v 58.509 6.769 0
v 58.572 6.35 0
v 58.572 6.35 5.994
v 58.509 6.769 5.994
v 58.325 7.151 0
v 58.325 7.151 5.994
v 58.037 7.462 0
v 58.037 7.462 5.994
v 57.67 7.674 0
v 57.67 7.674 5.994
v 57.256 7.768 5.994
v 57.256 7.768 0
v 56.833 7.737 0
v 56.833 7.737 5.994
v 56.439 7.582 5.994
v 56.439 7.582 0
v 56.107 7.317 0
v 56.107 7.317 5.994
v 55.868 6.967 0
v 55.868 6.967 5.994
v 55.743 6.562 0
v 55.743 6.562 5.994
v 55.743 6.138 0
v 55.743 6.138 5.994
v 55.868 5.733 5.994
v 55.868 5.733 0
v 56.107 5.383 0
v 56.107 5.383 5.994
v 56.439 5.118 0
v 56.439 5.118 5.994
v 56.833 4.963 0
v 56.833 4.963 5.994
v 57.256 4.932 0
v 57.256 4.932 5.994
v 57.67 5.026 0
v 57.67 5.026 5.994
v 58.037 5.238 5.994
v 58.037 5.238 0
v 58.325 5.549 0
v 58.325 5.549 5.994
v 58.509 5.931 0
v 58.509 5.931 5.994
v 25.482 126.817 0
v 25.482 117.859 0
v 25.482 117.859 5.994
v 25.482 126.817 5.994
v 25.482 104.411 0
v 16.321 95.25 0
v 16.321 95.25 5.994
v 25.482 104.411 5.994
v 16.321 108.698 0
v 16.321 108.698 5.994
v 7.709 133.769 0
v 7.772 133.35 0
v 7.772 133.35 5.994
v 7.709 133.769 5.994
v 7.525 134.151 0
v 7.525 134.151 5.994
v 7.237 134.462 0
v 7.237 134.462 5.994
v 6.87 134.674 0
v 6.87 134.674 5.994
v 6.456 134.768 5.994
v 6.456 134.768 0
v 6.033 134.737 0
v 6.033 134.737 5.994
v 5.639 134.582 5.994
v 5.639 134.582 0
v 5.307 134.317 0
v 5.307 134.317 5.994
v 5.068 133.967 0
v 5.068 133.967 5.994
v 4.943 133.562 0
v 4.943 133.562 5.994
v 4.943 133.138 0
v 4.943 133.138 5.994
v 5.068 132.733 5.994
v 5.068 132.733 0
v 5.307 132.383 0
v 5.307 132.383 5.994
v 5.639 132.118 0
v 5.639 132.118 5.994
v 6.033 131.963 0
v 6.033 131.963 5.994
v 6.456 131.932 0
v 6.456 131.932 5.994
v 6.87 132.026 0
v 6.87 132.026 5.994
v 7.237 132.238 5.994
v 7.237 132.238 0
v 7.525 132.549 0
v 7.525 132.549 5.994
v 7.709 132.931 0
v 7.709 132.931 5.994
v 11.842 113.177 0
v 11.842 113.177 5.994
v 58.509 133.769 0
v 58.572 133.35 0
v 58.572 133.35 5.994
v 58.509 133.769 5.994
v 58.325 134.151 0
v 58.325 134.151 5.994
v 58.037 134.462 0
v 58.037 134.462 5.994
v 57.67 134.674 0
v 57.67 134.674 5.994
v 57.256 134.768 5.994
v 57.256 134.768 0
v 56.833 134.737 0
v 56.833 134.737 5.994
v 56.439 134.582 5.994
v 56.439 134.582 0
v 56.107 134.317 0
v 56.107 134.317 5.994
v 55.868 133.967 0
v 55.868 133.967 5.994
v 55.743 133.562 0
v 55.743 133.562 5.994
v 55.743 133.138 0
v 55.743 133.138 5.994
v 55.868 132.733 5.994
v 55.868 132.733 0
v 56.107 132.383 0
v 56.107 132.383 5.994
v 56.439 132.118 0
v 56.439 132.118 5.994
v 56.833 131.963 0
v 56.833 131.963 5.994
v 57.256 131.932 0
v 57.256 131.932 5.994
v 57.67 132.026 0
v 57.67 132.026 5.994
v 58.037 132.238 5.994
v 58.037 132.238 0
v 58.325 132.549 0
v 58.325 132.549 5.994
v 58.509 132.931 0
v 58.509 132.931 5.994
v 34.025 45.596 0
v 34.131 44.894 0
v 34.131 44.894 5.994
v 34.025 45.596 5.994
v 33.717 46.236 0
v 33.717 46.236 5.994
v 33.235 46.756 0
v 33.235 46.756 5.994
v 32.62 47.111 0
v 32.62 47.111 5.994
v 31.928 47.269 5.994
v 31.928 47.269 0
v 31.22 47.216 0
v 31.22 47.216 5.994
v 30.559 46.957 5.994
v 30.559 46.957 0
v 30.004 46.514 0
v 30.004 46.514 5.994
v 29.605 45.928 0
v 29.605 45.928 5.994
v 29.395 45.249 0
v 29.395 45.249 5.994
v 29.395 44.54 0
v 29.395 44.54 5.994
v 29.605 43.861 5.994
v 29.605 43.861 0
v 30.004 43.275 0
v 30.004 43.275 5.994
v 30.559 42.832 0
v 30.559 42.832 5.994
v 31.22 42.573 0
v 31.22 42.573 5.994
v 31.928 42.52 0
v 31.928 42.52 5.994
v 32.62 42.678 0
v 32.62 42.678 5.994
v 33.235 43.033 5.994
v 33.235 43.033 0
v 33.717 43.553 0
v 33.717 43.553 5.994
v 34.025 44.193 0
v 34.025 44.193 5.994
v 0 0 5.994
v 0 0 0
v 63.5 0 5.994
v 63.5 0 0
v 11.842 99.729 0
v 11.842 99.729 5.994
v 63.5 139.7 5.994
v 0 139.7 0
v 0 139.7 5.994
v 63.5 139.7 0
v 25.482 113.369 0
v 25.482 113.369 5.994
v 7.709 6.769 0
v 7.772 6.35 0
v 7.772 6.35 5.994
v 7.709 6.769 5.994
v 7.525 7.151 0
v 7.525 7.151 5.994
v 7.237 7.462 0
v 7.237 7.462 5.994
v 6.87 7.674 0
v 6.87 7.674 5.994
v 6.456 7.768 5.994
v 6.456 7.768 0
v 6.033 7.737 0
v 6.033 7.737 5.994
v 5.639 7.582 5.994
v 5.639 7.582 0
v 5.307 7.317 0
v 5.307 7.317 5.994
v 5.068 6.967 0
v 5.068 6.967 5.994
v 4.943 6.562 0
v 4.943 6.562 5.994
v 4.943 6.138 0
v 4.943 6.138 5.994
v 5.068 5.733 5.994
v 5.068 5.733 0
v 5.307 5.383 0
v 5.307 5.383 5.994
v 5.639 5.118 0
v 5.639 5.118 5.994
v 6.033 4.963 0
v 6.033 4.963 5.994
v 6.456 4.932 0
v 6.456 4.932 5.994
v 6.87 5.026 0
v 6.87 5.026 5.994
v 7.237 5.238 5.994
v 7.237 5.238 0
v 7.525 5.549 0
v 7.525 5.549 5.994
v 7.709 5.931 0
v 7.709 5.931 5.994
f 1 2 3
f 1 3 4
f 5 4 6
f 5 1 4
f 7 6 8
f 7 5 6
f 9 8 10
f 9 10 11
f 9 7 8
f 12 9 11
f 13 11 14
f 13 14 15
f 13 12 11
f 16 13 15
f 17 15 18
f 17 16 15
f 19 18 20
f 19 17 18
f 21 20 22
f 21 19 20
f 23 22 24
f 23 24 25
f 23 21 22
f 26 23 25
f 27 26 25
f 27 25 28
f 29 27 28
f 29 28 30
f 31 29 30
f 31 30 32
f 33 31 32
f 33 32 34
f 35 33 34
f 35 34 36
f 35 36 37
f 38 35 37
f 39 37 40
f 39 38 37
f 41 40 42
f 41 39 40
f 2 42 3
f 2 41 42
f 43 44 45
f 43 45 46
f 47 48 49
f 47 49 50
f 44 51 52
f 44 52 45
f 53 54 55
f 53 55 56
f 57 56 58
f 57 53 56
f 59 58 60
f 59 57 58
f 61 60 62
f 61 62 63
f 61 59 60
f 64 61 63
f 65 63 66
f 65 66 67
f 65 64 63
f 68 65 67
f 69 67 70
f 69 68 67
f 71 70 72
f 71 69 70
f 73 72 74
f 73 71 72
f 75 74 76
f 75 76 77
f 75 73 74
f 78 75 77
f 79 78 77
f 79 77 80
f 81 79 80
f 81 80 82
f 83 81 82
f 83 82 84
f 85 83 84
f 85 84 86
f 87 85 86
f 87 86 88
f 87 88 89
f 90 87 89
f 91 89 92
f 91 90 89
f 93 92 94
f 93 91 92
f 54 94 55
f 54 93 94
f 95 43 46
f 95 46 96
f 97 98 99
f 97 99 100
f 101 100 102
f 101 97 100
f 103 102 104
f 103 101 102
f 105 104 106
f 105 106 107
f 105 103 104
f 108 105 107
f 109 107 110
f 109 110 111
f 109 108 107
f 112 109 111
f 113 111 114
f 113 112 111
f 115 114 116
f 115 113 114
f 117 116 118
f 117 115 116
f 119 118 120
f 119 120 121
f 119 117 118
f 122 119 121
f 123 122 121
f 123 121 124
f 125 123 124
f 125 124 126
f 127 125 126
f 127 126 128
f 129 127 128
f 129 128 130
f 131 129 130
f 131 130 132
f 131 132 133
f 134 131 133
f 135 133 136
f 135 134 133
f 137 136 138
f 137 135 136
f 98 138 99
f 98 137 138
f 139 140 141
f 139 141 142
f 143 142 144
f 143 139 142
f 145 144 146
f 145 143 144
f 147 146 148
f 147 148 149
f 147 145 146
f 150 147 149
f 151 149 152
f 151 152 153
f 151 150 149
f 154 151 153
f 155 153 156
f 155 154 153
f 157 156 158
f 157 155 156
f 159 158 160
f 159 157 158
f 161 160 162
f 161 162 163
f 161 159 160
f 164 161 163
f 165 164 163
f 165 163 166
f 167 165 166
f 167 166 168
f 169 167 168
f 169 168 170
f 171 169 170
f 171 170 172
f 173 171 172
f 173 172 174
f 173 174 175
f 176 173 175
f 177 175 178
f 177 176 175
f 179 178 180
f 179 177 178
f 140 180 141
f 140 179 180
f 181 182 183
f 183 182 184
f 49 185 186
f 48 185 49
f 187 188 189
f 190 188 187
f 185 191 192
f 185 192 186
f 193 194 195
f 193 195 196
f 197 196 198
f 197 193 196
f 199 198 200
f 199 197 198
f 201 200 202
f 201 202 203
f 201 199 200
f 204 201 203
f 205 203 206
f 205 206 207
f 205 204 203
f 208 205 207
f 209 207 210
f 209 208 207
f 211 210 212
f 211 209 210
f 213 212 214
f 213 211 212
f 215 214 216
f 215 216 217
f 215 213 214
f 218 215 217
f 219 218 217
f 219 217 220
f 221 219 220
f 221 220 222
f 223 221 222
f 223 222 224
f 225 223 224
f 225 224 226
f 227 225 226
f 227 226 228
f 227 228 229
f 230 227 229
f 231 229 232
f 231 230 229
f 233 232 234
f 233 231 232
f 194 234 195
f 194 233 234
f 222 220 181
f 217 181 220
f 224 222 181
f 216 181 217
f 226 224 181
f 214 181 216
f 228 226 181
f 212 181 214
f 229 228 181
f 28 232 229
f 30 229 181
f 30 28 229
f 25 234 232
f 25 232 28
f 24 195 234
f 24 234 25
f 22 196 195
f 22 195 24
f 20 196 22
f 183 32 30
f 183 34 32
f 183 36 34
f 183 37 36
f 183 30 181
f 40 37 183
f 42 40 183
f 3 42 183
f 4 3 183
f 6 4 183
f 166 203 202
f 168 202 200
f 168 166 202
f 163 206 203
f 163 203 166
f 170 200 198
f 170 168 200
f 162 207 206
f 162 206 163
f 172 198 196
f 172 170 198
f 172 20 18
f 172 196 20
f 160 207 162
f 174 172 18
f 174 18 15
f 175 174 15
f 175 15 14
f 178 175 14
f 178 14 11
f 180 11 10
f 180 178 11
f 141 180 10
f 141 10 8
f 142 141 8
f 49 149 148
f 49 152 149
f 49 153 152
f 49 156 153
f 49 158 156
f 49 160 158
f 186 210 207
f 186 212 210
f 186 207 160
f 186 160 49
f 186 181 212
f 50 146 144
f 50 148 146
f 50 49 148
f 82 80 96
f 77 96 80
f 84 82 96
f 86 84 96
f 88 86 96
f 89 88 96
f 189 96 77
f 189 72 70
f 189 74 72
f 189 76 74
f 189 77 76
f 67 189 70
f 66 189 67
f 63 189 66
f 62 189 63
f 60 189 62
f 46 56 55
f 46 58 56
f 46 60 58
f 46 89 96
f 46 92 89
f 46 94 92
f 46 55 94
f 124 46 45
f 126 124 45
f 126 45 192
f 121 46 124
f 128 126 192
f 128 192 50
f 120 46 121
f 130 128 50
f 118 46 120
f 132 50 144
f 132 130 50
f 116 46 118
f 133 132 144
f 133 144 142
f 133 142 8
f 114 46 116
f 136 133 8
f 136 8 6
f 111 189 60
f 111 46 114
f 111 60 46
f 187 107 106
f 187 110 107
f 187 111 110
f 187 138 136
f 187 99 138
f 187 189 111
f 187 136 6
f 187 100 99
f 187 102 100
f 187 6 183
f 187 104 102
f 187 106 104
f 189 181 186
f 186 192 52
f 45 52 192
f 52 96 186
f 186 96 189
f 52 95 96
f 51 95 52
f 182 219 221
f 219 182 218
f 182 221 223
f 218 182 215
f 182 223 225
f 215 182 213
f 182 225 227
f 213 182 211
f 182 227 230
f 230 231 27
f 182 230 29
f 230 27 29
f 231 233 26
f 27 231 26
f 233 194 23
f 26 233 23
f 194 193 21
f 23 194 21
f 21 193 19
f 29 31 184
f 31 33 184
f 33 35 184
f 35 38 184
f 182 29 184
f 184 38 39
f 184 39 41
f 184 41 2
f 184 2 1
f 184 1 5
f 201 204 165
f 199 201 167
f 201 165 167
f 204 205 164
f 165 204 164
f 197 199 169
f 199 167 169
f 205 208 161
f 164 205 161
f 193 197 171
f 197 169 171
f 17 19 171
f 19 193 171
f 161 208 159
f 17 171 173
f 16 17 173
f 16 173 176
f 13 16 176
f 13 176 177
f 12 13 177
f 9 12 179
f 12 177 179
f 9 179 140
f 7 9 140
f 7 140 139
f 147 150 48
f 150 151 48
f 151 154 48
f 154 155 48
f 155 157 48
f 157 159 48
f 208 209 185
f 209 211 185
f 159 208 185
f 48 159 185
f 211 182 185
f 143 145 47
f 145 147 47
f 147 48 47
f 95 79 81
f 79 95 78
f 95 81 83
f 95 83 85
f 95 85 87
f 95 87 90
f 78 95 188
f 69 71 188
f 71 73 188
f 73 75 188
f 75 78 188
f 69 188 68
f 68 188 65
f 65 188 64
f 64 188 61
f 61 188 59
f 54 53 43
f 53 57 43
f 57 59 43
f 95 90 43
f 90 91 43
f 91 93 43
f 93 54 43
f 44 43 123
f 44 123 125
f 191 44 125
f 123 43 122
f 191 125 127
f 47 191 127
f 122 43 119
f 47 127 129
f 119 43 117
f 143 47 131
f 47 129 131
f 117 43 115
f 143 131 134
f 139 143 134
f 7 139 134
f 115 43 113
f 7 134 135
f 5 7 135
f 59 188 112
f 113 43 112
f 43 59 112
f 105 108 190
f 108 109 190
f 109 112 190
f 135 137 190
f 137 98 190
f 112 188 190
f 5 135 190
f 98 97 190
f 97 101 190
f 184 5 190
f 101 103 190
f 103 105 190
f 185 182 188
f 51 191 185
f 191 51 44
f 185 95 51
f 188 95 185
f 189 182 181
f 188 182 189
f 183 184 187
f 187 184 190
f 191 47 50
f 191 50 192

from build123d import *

# Parameters (mm, degrees)
SKETCH1_W           = 63.5
SKETCH1_H           = 139.7
SKETCH1_R           = 1.4224
SKETCH1_R_2         = 2.38125
BOSS_EXTRUDE1_DEPTH = 5.9944


with BuildPart() as part:
    # Sketch1 → Boss-Extrude1 (new body)
    with BuildSketch(Plane.XY):
        with Locations((31.75, 69.85)):
            Rectangle(SKETCH1_W, SKETCH1_H)
        with Locations((6.35, 133.35)):
            Circle(SKETCH1_R, mode=Mode.SUBTRACT)
        with Locations((57.15, 133.35)):
            Circle(SKETCH1_R, mode=Mode.SUBTRACT)
        with Locations((57.15, 6.35)):
            Circle(SKETCH1_R, mode=Mode.SUBTRACT)
        with Locations((6.35, 6.35)):
            Circle(SKETCH1_R, mode=Mode.SUBTRACT)
        with Locations((31.75, 44.8945)):
            Circle(SKETCH1_R_2, mode=Mode.SUBTRACT)
        Polygon((25.481826149, 104.411127028), (25.481826149, 113.369073478), (11.841725896, 99.728973225), (16.320699121, 95.25), align=None, mode=Mode.SUBTRACT)
        Polygon((25.481826149, 117.859201538), (25.481826149, 126.817147988), (11.841725896, 113.177047735), (16.320699121, 108.69807451), align=None, mode=Mode.SUBTRACT)
    extrude(amount=BOSS_EXTRUDE1_DEPTH)


solid = part.part
